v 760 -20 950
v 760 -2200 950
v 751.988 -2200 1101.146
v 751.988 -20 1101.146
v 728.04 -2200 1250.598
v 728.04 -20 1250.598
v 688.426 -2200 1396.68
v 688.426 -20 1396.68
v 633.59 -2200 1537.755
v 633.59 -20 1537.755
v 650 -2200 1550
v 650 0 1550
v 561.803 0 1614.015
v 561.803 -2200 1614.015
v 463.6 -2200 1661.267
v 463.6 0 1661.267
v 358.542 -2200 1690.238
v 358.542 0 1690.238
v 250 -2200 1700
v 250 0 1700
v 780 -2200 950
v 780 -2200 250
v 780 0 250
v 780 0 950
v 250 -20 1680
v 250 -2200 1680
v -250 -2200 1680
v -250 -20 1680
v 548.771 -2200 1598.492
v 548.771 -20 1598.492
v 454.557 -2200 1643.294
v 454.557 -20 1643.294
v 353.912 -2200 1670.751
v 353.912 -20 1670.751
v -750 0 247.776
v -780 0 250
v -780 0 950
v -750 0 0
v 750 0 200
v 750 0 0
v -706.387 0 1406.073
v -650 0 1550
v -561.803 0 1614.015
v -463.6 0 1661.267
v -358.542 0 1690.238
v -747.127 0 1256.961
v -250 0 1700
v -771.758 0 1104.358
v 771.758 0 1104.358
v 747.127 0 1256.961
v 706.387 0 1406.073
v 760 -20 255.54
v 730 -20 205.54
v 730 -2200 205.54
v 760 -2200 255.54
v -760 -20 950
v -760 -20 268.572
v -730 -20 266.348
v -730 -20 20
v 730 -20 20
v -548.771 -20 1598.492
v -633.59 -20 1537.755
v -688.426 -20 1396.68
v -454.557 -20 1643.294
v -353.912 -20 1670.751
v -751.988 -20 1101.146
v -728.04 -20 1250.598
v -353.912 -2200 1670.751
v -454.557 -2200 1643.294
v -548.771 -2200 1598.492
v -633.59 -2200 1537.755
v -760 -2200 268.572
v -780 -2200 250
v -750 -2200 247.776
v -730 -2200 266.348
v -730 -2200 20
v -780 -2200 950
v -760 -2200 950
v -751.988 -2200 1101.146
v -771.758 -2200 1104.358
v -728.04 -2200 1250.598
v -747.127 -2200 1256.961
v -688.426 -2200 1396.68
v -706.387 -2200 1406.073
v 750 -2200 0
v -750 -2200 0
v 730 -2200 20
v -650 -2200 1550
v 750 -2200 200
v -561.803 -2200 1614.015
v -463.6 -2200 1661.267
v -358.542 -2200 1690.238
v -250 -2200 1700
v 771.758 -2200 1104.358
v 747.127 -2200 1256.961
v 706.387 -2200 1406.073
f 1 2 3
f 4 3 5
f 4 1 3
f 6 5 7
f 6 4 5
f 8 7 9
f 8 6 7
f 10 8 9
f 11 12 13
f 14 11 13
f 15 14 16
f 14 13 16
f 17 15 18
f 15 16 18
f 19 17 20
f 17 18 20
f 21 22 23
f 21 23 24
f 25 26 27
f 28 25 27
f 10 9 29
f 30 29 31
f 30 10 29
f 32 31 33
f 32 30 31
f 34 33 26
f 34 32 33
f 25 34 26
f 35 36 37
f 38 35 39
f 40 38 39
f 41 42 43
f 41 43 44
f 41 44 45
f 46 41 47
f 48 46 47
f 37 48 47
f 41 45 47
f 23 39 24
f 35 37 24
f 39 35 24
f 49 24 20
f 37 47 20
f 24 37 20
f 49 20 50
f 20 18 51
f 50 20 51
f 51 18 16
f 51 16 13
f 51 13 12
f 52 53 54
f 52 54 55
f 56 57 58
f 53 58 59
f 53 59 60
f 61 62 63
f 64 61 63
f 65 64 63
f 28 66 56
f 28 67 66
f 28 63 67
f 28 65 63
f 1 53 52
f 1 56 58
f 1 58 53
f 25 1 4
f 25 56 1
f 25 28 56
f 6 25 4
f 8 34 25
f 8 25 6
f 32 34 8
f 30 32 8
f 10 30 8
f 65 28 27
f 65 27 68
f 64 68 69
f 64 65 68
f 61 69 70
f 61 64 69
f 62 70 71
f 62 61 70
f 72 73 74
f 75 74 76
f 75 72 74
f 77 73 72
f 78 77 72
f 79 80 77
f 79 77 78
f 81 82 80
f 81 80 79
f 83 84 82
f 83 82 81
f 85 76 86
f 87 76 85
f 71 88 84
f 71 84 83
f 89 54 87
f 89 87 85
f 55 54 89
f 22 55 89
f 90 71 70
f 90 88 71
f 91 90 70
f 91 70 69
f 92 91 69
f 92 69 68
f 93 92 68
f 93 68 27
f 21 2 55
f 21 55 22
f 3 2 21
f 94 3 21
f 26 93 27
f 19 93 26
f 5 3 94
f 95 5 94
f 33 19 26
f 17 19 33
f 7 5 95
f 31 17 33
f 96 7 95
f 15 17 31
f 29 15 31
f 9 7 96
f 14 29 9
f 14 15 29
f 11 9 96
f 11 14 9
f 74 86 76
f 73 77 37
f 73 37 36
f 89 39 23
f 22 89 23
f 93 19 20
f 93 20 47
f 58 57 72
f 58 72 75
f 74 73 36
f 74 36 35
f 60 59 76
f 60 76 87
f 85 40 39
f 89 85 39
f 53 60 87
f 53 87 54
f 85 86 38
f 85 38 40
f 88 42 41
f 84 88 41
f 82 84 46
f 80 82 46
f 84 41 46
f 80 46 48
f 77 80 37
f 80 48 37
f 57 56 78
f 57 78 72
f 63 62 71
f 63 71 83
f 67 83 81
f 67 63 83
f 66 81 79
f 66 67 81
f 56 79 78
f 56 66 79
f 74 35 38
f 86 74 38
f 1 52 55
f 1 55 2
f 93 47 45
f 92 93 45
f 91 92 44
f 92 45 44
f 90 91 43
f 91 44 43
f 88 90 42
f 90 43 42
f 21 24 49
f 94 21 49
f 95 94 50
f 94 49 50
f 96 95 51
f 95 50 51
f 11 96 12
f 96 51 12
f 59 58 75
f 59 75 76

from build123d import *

# Parameters (mm, degrees)
F1_DEPTH = 2200
F2_T     = -20


with BuildPart() as f1:
    # F0 (on Front) → F1 (new body)
    with BuildSketch(Plane.XZ):
        with BuildLine():
            Line((-750, 247.7760155038), (-750, 0))
            Line((-750, 0), (750, 0))
            Line((750, 0), (750, 200))
            Line((750, 200), (780, 250))
            Line((780, 250), (780, 950))
            ThreePointArc((780, 950), (747.1272749081, 1256.9609095634), (650, 1550))
            ThreePointArc((650, 1550), (463.6000936329, 1661.2669163545), (250, 1700))
            Line((250, 1700), (-250, 1700))
            ThreePointArc((-250, 1700), (-463.6000936329, 1661.2669163545), (-650, 1550))
            ThreePointArc((-650, 1550), (-747.1272749081, 1256.9609095634), (-780, 950))
            Line((-780, 950), (-780, 250))
            Line((-780, 250), (-750, 247.7760155038))
        make_face()
    extrude(amount=F1_DEPTH)

    # F2
    f2_openings = [f1.faces().sort_by_distance(p)[0] for p in [
        (0.216994, -2200, 818.750075),
    ]]
    offset(amount=F2_T, openings=f2_openings, kind=Kind.INTERSECTION)


solid = f1.part
